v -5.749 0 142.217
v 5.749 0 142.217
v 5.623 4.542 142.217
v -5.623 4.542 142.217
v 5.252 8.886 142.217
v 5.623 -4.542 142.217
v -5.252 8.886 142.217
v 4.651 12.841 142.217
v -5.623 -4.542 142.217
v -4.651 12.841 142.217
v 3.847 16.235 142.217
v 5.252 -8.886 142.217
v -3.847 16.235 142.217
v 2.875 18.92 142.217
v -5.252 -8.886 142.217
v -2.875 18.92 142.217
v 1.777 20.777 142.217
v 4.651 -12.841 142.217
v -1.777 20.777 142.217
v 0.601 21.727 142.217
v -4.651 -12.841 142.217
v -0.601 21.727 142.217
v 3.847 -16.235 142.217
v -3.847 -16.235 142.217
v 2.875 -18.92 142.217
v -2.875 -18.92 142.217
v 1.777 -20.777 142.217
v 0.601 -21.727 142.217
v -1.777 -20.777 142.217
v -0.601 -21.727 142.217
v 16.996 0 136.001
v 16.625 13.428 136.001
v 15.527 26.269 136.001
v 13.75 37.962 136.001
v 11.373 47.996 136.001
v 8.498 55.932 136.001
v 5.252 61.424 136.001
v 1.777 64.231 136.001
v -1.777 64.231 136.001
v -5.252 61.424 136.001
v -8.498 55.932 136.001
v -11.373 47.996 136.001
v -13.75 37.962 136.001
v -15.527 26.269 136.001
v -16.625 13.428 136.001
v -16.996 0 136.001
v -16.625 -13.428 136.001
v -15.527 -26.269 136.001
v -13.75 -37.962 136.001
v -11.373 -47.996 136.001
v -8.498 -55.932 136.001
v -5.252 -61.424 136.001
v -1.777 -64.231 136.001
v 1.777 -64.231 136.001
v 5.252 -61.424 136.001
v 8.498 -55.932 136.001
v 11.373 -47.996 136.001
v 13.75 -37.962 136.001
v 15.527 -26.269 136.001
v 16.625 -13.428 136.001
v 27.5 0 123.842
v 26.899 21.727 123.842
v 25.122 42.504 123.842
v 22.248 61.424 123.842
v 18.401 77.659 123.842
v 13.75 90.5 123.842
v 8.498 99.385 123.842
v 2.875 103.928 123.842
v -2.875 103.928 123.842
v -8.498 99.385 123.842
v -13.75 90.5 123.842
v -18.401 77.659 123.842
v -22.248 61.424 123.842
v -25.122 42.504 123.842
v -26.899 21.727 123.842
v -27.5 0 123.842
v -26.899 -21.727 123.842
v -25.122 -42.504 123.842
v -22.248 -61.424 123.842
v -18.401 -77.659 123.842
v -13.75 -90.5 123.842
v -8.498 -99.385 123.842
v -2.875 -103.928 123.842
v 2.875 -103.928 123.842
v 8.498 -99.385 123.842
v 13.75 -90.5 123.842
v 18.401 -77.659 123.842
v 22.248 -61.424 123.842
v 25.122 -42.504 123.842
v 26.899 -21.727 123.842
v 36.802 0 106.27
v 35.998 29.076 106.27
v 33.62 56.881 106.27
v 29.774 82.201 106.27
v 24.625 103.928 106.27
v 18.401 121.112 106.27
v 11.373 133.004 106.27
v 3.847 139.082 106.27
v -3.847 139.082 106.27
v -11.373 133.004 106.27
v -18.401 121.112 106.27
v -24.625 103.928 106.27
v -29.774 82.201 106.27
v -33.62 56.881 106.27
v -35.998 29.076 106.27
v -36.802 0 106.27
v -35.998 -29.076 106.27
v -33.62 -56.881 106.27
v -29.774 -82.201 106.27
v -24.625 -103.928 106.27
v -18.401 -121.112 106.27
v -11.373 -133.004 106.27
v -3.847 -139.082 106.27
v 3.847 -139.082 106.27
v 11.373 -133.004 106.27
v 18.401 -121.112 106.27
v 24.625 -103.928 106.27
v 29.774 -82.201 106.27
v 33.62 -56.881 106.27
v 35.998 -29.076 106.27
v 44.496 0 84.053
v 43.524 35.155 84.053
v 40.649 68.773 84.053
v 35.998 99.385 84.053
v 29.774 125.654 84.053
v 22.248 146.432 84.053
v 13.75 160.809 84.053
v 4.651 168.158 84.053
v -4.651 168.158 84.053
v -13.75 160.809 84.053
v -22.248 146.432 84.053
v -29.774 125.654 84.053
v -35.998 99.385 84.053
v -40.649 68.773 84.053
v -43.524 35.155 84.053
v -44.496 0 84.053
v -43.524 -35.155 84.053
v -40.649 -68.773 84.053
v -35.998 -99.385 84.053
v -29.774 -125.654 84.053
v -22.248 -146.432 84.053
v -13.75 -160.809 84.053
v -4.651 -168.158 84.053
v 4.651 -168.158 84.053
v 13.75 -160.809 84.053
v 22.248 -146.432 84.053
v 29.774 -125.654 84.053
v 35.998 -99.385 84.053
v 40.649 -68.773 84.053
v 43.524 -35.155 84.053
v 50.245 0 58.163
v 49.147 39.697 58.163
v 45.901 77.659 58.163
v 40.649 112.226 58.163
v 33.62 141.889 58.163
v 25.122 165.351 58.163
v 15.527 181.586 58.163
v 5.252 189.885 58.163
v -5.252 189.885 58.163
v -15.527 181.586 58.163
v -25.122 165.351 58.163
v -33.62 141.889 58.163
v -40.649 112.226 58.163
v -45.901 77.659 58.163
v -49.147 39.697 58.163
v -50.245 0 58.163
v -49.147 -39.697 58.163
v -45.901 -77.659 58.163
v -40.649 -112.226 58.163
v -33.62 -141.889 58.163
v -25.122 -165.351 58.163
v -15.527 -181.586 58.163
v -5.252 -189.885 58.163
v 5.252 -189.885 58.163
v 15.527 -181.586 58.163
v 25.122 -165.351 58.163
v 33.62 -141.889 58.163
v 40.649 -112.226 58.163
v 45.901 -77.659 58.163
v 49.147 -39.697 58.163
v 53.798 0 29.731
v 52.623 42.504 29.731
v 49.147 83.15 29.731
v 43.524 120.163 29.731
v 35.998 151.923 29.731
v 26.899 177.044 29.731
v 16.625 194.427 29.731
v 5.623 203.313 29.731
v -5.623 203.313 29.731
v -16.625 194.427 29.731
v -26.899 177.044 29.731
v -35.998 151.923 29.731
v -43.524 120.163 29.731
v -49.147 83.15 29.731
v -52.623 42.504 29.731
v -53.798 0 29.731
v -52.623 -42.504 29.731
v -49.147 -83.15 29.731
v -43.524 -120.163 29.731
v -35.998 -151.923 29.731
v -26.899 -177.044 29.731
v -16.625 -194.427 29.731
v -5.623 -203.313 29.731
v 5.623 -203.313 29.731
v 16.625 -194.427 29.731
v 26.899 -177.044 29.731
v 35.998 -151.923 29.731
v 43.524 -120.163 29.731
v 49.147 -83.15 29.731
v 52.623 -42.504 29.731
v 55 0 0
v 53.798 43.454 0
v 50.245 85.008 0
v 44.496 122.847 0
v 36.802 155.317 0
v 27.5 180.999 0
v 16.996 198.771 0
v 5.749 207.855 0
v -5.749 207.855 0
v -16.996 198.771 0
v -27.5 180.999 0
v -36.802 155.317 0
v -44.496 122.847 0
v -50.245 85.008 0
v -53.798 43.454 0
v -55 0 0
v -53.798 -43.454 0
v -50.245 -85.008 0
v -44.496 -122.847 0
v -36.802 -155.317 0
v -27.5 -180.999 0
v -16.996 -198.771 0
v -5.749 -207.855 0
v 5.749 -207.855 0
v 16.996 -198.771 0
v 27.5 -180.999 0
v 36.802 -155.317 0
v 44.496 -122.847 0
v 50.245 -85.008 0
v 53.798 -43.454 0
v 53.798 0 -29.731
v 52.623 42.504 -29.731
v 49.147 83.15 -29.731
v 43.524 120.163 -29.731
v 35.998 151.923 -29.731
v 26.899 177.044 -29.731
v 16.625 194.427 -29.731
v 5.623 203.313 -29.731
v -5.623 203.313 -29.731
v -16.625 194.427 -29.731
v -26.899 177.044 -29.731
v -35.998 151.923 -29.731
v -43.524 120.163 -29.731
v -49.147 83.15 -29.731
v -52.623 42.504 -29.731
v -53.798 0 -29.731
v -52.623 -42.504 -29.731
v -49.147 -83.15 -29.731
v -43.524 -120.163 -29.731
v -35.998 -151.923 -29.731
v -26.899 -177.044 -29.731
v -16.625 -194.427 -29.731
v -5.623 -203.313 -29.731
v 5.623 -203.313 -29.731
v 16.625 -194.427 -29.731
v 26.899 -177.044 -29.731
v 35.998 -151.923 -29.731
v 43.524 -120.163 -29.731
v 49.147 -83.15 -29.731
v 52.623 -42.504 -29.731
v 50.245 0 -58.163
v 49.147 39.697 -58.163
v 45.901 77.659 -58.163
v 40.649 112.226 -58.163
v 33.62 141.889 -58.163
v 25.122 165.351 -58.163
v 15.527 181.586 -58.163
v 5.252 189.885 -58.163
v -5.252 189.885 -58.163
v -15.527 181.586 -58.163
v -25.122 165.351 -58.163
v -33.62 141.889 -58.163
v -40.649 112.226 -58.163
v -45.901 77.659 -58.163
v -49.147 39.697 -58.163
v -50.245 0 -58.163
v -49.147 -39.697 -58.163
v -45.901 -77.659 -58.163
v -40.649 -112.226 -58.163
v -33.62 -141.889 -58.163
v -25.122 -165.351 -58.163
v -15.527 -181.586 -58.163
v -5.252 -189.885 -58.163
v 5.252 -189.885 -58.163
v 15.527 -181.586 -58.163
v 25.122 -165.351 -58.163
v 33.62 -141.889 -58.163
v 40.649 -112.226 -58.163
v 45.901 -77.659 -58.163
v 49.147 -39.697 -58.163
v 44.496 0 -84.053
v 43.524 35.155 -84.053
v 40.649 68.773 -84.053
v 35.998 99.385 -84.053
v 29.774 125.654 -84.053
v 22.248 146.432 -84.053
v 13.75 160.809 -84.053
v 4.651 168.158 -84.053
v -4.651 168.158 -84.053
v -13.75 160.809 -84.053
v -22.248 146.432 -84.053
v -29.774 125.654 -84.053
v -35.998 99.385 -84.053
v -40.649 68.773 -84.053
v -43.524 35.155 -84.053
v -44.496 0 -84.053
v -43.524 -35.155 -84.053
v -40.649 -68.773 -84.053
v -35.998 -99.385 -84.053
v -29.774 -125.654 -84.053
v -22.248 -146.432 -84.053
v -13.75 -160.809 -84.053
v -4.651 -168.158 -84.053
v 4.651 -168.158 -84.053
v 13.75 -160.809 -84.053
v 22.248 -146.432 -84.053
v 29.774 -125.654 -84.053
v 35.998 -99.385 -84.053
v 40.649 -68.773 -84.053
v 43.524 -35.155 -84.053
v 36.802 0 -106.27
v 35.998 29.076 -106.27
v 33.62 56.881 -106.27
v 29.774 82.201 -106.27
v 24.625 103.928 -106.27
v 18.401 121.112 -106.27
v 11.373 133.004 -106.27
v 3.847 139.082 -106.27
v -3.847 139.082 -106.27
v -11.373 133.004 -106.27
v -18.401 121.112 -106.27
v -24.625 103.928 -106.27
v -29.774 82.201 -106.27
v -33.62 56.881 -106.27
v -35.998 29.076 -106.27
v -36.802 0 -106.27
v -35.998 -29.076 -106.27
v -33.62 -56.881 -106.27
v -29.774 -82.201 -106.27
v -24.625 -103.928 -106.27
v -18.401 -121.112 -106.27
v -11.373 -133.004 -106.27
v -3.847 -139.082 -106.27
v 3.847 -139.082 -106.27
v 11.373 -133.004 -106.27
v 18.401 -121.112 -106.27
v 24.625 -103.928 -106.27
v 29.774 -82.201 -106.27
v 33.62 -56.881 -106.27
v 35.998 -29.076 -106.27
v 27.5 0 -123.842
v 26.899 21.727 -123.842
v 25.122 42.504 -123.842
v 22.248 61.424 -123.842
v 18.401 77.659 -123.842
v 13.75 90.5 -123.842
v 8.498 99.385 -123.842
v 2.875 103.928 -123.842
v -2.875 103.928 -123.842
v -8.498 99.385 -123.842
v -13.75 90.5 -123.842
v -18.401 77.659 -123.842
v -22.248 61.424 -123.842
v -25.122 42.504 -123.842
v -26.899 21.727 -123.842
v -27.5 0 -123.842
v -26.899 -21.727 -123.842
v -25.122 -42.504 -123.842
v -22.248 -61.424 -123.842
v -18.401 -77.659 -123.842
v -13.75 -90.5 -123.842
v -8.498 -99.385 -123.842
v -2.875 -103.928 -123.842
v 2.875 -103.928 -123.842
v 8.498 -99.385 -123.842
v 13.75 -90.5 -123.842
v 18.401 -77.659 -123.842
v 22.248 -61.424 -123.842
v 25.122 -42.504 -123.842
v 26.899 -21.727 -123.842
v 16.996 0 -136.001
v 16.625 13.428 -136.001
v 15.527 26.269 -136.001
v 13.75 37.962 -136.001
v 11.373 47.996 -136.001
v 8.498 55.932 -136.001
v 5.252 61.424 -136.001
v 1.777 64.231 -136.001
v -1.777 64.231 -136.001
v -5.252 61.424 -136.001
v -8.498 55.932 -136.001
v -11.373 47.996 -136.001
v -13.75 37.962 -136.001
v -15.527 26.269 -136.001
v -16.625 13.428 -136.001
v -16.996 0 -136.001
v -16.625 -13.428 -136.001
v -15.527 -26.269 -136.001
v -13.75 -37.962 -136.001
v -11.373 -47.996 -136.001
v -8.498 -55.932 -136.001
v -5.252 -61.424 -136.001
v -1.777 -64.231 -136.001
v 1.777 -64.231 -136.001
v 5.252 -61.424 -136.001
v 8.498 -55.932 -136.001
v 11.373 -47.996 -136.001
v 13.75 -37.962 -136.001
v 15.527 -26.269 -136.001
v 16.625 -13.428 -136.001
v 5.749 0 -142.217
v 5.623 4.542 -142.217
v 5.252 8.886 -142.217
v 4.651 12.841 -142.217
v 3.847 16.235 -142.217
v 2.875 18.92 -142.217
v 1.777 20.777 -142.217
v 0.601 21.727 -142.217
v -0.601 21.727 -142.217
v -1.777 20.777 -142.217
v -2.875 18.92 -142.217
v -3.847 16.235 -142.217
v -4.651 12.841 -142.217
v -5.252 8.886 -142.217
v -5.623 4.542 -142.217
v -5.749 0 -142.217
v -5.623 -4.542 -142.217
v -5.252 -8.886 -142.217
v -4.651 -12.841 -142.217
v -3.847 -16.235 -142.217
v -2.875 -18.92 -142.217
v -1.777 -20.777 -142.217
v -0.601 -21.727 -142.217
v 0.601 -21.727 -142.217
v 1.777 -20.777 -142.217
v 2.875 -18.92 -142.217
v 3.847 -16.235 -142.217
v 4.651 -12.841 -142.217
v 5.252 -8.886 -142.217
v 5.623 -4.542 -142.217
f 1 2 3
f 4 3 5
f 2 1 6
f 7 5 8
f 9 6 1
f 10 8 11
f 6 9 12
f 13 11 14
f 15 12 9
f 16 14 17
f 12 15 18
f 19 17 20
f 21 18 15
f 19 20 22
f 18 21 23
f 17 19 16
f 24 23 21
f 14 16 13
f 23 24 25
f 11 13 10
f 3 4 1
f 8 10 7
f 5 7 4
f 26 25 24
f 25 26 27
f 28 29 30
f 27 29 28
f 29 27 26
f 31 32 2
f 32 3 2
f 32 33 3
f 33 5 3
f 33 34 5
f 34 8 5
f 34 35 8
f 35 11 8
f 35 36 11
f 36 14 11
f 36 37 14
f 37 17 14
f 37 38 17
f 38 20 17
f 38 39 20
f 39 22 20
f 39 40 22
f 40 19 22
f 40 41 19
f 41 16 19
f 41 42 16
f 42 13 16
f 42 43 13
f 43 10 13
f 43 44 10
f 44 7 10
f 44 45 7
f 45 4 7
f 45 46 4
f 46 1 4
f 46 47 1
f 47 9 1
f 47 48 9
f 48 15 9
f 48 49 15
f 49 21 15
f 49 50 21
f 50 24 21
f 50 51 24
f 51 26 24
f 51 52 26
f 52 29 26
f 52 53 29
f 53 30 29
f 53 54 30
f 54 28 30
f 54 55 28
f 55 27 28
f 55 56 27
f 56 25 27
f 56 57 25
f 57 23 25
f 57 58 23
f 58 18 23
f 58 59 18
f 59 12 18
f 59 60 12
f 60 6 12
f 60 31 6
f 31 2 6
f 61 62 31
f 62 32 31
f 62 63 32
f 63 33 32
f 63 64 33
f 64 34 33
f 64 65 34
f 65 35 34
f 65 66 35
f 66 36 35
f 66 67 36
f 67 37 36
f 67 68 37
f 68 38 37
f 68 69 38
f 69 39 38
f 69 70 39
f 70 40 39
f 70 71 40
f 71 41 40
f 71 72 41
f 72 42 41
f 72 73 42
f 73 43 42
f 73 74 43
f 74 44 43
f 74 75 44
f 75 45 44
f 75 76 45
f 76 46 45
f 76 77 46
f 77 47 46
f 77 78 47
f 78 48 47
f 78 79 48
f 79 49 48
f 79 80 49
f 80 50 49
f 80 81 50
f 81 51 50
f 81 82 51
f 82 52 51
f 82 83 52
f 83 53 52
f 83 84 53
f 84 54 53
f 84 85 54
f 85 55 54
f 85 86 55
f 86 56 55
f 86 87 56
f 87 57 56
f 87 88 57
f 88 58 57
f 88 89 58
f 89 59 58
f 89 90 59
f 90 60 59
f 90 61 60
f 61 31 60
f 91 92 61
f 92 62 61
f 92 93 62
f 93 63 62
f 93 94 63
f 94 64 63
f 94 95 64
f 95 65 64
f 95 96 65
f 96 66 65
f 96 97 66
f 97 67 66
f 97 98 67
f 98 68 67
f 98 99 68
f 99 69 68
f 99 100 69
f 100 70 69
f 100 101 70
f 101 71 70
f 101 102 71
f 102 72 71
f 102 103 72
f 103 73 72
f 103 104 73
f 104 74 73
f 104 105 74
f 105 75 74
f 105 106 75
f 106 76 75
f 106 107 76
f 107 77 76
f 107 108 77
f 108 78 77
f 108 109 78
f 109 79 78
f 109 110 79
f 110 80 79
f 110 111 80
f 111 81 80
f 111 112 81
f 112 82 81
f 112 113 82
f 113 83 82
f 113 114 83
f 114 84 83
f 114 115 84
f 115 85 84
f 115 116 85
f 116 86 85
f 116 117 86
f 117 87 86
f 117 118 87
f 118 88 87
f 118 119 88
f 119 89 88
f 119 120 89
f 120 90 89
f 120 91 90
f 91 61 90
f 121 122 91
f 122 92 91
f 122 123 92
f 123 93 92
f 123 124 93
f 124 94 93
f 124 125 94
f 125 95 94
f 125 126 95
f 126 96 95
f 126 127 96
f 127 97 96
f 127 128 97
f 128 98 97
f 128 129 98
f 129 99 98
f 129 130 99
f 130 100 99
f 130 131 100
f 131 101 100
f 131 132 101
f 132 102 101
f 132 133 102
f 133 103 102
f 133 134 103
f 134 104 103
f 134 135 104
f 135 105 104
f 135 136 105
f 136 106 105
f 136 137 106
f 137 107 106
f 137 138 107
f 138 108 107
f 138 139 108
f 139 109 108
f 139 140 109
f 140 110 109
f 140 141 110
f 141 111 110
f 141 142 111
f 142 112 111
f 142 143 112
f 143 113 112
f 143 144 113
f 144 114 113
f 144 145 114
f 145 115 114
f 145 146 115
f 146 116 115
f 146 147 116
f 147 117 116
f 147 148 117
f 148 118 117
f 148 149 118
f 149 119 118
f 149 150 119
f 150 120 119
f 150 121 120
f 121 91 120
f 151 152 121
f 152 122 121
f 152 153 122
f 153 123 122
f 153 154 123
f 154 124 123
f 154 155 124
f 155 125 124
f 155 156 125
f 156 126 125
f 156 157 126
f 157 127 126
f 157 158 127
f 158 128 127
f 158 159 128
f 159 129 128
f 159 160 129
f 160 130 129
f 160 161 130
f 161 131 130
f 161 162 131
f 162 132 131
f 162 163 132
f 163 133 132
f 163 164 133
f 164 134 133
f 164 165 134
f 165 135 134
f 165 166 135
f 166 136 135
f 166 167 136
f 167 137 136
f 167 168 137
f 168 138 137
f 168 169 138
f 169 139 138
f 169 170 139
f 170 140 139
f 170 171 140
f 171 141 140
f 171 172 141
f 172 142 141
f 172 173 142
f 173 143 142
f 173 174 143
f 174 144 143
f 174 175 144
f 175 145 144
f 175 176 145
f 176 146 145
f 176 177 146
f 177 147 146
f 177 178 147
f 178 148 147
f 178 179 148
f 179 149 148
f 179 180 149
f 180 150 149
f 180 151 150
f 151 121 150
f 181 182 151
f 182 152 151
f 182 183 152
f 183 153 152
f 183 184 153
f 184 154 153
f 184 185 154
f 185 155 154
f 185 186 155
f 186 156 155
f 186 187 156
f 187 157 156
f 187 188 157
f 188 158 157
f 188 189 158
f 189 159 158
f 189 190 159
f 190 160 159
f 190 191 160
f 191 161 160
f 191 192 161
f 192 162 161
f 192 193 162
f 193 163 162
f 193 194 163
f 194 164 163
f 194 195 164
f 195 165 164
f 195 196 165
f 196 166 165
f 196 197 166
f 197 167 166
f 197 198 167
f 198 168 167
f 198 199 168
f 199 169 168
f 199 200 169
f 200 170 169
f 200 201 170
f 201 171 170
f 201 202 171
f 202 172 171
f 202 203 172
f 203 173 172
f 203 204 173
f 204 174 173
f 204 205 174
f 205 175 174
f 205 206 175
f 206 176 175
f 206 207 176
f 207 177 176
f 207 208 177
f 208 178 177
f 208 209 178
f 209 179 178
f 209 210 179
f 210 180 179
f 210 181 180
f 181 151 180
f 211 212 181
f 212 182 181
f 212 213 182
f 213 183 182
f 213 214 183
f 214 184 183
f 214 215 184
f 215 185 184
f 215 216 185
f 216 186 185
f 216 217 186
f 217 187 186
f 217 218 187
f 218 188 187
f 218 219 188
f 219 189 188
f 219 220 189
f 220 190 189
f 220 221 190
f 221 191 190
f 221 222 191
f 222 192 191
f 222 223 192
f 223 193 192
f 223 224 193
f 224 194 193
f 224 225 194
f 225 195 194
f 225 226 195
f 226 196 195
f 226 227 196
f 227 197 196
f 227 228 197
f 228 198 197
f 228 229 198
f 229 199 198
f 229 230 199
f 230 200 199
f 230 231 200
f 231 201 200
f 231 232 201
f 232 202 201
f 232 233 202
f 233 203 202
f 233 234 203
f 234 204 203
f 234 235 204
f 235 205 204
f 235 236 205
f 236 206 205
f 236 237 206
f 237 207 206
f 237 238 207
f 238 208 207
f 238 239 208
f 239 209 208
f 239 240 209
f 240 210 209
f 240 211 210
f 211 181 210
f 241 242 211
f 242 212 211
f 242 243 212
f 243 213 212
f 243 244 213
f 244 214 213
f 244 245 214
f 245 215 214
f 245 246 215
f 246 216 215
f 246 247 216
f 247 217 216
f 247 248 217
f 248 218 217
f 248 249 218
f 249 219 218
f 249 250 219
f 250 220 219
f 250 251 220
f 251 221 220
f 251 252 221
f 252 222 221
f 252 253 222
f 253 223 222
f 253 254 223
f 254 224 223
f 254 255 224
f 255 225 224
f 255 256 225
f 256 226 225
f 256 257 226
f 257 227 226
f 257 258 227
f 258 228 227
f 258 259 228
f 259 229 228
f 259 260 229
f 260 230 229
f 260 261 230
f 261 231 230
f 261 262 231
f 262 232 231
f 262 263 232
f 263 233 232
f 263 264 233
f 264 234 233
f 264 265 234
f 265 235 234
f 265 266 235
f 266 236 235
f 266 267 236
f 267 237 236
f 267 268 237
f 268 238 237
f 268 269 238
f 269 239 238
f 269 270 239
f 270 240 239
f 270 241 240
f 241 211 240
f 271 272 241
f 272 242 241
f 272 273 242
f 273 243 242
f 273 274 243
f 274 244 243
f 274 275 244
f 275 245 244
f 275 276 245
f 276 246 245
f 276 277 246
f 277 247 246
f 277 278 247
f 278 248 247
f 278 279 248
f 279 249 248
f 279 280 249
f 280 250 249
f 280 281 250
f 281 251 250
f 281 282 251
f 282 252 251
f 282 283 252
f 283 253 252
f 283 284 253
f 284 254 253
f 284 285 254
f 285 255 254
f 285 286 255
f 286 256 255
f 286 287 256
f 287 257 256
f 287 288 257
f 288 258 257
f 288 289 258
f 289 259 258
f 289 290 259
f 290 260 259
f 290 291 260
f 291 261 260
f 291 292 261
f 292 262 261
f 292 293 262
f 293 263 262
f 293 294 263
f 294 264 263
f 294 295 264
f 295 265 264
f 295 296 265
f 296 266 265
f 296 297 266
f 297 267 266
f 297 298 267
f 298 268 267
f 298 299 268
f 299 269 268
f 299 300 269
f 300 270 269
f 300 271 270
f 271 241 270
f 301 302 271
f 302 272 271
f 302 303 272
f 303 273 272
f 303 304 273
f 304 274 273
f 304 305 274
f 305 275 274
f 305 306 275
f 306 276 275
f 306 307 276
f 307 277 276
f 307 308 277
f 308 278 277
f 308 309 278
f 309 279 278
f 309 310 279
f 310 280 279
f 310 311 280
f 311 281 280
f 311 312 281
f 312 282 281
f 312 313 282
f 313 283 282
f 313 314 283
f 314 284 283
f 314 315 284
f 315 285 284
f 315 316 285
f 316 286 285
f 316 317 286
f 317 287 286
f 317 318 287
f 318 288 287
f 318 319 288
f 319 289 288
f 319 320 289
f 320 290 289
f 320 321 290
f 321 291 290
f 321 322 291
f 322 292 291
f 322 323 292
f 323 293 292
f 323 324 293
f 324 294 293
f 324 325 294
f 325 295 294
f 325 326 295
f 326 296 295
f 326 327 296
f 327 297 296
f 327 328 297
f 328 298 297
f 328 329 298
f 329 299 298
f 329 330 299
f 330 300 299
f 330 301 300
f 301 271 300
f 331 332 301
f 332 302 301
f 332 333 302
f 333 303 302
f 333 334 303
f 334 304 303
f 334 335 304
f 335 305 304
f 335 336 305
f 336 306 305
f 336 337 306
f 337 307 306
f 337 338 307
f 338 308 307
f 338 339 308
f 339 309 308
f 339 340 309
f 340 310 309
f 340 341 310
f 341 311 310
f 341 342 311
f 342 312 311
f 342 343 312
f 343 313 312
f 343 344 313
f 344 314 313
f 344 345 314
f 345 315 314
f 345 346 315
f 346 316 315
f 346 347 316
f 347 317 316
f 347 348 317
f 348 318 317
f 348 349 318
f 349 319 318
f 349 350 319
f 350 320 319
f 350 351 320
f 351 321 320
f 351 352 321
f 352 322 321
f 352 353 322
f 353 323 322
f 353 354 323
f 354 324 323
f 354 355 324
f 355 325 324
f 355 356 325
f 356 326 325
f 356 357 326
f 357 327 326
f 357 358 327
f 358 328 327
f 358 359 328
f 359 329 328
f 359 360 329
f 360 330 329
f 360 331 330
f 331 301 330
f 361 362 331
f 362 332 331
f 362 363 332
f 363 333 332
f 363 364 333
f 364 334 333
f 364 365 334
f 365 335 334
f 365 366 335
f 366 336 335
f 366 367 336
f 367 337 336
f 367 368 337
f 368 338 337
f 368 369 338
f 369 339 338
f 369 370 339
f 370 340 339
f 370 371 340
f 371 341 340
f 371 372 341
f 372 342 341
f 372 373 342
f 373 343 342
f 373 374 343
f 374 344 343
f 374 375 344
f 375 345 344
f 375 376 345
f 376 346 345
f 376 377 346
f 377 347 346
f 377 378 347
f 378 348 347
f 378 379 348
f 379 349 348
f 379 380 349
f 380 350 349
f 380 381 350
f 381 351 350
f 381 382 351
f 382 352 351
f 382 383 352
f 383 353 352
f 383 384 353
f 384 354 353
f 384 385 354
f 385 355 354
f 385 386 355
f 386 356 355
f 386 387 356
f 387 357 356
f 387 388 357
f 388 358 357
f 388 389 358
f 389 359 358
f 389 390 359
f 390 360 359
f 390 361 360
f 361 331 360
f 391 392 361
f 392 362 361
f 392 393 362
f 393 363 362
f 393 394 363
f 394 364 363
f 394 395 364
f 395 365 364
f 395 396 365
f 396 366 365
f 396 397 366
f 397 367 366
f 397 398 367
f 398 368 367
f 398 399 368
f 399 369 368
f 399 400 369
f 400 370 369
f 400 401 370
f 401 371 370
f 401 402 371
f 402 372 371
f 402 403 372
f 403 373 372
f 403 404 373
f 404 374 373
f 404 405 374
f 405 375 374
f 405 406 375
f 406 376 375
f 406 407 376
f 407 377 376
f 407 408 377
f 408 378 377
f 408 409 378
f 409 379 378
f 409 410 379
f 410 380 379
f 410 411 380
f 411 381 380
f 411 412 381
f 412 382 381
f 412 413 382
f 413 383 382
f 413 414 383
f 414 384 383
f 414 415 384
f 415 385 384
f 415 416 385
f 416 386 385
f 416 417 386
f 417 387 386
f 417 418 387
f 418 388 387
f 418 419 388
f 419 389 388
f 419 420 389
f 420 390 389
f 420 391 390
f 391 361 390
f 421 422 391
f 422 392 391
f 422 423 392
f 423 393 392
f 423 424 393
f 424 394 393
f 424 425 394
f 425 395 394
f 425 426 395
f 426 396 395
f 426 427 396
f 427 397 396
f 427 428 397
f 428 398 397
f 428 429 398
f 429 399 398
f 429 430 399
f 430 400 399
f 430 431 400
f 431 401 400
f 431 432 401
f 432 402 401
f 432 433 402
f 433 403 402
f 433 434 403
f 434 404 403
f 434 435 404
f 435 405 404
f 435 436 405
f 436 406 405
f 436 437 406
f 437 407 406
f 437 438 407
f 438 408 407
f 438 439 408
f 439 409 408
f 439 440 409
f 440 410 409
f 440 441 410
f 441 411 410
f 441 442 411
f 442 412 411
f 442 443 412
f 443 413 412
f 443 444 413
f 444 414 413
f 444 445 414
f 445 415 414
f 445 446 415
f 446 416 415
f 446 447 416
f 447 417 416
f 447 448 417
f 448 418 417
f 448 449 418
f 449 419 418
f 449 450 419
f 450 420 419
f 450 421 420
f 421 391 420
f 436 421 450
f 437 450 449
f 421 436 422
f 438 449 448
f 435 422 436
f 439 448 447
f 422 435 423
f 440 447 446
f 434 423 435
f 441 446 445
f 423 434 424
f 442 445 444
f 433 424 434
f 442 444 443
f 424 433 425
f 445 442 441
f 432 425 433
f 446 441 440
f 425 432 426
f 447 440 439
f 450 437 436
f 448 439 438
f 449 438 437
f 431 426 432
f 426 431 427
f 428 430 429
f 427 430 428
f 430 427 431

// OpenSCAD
// Generated by SolidPython 1.0.1 on 2020-07-29 00:46:47


scale(v = [5, 19, 13]) {
	sphere(r = 11);
}
/***********************************************
*********      SolidPython code:      **********
************************************************
 
# import packages: SolidPython
from solid import *
from solid.utils import *
from itertools import chain, combinations, permutations


class Resize:

    def __init__(self, scad_file):
        self.scad_file = scad_file
        #self.scad_file = import_scad(scad_file)
        # cone/cylinder param:
        self.r1 = 0
        self.r2 = 0
        self.h = 0
        # rectangular prism param:
        self.w = 0
        self.l = 0
        # ellipse param:
        self.r = 0

    # import OpenScad code (file name corresponds to shape)


    # classify shape + parameters
    def assign(self, param1, param2, param3):
        if self.scad_file == 'cone.scad':
            self.r1 = param1
            self.r2 = param2
            self.h = param3
        elif self.scad_file == 'cylinder.scad':
            self.r1 = param1
            self.r2 = param2
            self.h = param3
        elif self.scad_file == 'rectangularPrism.scad':
            self.h = param1
            self.l = param2
            self.w = param3
        else:
            self.r = param1
            self.h = param2

    # resize parameters
    def iterate(self):
        x = range(3, 20, 2)
        i = 1
        if self.scad_file == 'cone.scad':
            tempList = list(permutations(x, 2))
            for temp in tempList:
                param1 = temp[0]
                param2 = temp[1]
                filepath = 'produced_scad_files/' + 'cone' + str(param1) + '_' + str(param2) + '_' + '.scad'
                scad_render_to_file(cylinder(h=param1, r1=param2, r2=0), filepath)

        elif self.scad_file == 'cylinder.scad':
            tempList = list(permutations(x, 3))
            for temp in tempList:
                param1 = temp[0]
                param2 = temp[1]
                filepath = 'produced_scad_files/' + 'cylinder' + str(param1) + '_' + str(param2) + '_' + '.scad'
                scad_render_to_file(cylinder(h=param1, r1=param2, r2=param2), filepath)

        elif self.scad_file == 'rectangularPrism.scad':
            tempList = list(permutations(x, 3))
            for temp in tempList:
                param1 = temp[0]
                param2 = temp[1]
                param3 = temp[2]
                filepath = 'produced_scad_files/' + 'rectangularPrism' + str(param1) + '_' + str(param2) + '_' + str(
                    param3) + '.scad'
                scad_render_to_file(cube(size=(param1, param2, param3)), filepath)

        elif self.scad_file == 'ellipse.scad':
            tempList = list(permutations(x, 4))
            for temp in tempList:
                param1 = temp[0]
                param2 = temp[1]
                param3 = temp[2]
                param4 = temp[3]
                filepath = 'produced_scad_files/' + 'ellipse' + str(param1) + '_' + str(param2) + '_' + str(param3) + '_' + str(param4) + '.scad'
                scad_render_to_file(scale([param1, param2, param3])(sphere(r=param4)), filepath)

    def render_to_scadfile(self):
        scad_render_to_file(scad, 'example.scad') 
 
************************************************/
